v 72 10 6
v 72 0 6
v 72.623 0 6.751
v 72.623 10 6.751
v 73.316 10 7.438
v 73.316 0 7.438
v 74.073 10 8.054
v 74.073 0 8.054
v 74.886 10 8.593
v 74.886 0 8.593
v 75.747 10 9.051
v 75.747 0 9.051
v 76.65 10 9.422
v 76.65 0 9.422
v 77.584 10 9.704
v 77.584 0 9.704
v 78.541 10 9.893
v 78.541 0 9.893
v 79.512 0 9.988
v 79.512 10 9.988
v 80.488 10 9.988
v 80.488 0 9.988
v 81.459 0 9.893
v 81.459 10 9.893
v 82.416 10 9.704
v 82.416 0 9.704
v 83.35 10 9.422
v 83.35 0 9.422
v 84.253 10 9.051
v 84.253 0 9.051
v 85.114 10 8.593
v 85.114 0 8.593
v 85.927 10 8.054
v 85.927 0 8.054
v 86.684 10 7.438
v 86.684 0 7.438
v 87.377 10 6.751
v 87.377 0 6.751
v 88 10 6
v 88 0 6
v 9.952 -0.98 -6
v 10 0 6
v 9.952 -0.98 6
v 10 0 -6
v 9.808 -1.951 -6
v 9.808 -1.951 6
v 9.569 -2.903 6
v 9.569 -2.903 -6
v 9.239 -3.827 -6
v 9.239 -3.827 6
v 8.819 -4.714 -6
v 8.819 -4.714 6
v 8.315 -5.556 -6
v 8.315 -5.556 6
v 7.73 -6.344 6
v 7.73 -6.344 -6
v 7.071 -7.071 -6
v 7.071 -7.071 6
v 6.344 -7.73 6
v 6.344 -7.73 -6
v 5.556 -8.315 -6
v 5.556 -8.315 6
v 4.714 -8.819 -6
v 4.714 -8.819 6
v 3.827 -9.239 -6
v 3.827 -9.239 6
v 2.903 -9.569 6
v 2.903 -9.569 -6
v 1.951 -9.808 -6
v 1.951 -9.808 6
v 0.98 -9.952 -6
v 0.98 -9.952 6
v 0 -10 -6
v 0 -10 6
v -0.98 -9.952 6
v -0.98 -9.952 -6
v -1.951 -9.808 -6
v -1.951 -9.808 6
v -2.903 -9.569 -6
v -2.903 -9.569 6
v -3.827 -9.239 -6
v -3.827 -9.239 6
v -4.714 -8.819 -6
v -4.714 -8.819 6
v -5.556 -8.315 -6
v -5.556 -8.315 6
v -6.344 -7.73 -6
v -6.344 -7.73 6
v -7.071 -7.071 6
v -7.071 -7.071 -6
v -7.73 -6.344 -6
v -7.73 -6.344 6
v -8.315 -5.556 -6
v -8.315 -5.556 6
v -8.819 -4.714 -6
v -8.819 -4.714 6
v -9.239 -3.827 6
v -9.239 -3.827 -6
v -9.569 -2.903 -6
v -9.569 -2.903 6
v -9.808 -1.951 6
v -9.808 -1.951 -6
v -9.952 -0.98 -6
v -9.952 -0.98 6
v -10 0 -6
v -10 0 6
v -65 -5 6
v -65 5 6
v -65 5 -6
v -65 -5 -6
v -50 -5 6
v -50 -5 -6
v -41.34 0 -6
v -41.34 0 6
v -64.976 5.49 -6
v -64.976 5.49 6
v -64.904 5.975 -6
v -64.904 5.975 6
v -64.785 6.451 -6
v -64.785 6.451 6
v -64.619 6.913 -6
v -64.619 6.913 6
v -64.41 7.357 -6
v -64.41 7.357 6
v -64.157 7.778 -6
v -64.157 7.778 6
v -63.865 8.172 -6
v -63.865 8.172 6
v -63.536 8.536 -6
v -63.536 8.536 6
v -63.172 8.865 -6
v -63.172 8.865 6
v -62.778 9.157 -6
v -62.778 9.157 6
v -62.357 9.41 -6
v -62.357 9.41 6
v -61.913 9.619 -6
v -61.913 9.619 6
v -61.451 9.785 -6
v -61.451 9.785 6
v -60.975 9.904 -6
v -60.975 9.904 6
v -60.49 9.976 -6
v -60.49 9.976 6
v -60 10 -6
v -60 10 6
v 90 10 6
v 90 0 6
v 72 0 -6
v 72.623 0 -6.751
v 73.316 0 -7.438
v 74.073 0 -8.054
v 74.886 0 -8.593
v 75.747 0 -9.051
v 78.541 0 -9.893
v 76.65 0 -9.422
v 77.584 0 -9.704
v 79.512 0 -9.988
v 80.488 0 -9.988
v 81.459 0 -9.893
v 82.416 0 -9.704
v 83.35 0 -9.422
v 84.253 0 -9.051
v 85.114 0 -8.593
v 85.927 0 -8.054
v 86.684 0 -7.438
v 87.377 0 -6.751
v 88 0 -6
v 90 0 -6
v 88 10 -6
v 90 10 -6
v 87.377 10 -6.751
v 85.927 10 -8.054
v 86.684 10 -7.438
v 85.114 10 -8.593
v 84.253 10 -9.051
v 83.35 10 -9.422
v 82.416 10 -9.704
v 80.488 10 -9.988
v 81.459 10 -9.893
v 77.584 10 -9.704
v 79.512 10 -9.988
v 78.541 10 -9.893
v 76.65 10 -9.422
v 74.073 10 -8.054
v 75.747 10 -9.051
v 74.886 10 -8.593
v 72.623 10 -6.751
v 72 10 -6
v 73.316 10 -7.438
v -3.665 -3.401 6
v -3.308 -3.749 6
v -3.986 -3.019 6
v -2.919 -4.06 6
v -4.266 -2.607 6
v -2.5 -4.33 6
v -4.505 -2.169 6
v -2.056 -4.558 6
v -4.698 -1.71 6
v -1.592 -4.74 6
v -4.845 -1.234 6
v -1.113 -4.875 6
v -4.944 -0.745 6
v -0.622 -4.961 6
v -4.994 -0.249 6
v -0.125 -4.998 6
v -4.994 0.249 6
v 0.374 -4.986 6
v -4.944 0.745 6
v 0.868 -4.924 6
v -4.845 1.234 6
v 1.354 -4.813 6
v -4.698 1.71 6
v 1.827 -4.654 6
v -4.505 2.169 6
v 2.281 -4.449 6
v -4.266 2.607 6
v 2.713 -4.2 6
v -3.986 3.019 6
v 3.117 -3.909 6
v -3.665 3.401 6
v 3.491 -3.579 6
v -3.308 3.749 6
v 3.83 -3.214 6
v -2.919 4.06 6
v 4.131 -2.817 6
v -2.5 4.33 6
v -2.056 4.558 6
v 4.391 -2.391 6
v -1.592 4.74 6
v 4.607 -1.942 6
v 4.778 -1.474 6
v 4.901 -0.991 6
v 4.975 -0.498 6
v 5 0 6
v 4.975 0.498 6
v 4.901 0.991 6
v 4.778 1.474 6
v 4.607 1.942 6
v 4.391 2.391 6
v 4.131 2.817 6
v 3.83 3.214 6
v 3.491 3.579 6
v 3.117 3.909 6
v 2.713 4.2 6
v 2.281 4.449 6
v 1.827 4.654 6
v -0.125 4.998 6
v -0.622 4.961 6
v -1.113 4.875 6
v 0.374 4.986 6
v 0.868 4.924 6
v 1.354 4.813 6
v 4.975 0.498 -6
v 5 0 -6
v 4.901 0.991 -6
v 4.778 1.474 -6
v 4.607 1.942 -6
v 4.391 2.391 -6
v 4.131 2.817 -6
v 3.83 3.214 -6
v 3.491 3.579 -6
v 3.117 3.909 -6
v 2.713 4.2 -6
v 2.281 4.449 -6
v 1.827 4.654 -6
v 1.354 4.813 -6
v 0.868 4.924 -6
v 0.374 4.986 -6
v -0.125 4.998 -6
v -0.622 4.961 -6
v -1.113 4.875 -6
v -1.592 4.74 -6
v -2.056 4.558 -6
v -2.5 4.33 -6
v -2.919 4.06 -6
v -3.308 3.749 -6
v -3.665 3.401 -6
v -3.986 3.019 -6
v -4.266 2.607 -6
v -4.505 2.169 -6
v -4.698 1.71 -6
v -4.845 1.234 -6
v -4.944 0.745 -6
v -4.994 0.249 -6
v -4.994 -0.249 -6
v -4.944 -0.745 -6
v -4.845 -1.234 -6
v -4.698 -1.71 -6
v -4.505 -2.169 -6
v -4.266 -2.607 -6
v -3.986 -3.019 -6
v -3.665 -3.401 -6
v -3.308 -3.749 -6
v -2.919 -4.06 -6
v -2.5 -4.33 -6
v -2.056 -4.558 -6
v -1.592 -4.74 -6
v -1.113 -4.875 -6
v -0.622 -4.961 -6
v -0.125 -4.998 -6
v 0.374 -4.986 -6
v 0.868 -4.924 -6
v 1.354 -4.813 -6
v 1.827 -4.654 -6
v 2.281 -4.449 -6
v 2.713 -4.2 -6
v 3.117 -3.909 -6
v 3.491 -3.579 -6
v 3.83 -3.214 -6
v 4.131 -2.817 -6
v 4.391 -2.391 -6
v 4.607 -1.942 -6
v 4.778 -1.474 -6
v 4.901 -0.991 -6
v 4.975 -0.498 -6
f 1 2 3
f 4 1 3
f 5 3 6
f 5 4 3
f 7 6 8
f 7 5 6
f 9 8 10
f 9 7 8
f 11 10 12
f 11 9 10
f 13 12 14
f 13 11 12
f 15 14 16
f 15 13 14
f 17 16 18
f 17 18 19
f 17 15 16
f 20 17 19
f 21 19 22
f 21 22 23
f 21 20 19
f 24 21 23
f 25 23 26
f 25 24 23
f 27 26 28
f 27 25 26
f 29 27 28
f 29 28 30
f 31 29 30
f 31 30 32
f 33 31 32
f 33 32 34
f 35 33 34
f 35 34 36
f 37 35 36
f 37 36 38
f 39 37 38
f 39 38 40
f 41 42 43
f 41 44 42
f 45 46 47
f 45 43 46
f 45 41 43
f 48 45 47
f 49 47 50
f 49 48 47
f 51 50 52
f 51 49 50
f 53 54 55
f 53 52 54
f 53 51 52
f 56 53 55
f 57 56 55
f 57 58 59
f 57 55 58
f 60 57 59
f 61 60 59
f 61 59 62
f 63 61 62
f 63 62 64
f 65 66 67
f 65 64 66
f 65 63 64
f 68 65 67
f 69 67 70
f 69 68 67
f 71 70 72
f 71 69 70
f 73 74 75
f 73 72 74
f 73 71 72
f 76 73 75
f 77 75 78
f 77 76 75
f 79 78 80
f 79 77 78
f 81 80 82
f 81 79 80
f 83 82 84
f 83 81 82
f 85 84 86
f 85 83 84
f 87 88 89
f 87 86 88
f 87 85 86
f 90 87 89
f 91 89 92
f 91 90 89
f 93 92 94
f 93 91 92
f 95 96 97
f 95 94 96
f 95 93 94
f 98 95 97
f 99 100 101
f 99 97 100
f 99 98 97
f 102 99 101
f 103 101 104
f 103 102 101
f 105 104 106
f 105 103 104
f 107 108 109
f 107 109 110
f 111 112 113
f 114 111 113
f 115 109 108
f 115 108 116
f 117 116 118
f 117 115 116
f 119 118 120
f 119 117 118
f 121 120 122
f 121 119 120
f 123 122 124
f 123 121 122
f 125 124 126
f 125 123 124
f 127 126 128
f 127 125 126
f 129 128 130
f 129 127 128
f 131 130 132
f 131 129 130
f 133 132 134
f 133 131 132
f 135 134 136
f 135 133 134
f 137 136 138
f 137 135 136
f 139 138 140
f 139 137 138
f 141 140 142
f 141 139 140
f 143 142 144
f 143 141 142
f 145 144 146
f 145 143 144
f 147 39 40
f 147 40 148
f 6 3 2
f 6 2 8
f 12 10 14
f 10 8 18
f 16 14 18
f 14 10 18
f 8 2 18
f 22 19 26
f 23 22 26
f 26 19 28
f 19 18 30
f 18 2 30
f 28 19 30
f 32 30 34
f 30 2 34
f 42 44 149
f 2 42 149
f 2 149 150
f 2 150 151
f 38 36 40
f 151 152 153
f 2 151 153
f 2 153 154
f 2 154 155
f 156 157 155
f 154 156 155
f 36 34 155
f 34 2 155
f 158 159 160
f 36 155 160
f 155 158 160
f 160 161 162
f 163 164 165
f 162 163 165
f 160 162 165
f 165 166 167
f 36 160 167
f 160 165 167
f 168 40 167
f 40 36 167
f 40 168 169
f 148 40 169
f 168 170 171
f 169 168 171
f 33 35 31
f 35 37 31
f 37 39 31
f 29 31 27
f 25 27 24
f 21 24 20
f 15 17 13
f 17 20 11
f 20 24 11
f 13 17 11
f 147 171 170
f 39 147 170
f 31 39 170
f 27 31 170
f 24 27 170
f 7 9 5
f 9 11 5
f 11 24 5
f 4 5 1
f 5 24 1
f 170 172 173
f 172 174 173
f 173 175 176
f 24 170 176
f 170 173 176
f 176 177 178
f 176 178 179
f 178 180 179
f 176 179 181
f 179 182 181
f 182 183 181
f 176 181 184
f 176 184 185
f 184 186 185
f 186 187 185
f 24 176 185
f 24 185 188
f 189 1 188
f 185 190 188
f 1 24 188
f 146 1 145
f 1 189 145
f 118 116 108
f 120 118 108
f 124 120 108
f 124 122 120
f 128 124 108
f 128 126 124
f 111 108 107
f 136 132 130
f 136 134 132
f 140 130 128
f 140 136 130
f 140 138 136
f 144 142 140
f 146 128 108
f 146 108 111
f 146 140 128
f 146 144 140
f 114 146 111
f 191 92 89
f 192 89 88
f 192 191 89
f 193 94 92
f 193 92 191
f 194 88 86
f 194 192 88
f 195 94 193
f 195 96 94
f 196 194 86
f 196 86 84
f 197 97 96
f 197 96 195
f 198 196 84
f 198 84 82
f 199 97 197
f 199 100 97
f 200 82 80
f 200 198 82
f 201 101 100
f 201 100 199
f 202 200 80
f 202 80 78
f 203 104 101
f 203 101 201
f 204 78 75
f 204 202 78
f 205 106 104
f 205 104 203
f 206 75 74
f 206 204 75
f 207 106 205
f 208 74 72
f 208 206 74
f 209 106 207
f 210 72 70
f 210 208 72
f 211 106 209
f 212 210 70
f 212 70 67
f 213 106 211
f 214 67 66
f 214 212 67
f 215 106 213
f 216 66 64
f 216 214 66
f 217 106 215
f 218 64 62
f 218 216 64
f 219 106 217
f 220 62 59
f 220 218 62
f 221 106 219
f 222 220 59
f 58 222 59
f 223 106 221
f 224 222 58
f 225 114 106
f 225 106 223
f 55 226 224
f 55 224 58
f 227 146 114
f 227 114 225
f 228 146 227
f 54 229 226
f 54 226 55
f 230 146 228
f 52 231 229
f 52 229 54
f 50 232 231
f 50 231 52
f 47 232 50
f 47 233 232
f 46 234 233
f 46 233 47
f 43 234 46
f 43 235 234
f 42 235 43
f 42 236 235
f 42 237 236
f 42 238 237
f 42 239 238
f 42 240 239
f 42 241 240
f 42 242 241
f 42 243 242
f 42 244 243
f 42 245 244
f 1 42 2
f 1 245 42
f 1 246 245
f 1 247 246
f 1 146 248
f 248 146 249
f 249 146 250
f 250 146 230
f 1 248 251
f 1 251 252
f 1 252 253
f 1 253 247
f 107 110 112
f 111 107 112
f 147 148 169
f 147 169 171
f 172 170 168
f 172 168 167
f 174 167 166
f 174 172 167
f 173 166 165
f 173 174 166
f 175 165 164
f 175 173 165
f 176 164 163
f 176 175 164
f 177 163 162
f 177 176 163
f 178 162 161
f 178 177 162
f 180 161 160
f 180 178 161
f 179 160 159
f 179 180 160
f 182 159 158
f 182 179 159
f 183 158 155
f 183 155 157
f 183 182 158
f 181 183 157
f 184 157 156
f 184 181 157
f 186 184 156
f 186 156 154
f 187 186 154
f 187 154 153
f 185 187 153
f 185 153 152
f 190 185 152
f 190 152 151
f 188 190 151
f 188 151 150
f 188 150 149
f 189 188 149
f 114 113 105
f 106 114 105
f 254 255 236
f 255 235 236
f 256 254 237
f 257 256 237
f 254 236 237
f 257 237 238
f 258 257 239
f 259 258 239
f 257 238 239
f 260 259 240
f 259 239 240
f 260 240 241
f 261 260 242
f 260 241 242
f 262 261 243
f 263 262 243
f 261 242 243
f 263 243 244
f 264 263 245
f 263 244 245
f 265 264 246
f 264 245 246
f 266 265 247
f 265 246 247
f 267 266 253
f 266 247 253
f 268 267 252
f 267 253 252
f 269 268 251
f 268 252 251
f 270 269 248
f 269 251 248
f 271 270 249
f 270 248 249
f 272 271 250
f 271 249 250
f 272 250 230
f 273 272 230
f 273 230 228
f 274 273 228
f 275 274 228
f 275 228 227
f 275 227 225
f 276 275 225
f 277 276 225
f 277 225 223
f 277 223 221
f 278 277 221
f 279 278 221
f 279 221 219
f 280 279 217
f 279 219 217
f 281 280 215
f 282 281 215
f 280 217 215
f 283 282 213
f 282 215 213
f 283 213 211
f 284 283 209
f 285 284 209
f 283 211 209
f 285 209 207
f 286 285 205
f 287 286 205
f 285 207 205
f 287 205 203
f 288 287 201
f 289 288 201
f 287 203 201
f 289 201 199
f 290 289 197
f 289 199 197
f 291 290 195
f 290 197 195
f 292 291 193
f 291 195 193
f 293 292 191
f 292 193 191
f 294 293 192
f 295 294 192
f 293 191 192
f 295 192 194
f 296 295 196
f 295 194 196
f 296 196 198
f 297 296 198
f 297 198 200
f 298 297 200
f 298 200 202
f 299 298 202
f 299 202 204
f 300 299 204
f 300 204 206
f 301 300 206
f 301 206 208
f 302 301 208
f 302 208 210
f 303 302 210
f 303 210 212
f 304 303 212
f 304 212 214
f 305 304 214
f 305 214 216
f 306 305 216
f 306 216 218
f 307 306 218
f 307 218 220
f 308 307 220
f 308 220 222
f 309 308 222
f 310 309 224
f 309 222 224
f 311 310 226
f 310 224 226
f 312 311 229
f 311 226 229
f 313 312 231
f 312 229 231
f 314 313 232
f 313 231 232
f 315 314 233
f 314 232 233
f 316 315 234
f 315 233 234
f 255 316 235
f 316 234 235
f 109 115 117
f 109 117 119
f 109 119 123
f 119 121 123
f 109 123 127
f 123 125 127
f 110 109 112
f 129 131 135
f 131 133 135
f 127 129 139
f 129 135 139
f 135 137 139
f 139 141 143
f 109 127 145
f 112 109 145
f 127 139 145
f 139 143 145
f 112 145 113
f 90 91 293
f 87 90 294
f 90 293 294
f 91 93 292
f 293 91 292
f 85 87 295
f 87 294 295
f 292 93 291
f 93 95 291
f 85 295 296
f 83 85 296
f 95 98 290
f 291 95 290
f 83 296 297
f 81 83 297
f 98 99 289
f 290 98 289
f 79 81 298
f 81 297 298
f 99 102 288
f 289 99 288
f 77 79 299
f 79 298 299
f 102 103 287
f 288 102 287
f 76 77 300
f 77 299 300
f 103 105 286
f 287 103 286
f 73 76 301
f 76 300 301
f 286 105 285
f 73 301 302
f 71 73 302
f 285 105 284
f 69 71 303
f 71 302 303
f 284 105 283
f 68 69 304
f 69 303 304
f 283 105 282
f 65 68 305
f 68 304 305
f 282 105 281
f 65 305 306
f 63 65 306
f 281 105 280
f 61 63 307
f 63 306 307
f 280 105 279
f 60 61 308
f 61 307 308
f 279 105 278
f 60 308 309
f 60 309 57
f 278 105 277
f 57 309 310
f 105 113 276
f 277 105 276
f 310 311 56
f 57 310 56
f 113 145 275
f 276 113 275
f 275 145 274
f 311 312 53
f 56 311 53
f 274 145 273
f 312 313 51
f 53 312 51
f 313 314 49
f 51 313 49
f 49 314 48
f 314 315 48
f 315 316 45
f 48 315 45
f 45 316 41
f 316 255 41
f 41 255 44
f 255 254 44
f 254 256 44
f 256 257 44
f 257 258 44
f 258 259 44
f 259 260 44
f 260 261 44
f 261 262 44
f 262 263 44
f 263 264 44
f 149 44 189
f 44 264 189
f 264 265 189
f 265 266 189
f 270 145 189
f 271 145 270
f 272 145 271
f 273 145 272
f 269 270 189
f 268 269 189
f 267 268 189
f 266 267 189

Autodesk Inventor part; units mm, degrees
ref_plane "YZ Plane" through (0, 0, 0) normal (1, 0, 0) x (0, 1, 0)
ref_plane "XZ Plane" through (0, 0, 0) normal (0, 1, 0) x (-1, 0, 0)
ref_plane "XY Plane" through (0, 0, 0) normal (0, 0, 1) x (1, 0, 0)
sketch "Esboço1" plane through (0, 0, 0) normal (0, 0, 1) x (1, 0, 0)
  arc A0 (-10, 0) -> (10, 0) centre (0, 0) ccw
  line L0 (10, 0) -> (90, 0)
  line L1 (90, 0) -> (90, 10)
  line L2 (90, 10) -> (-65, 10)
  line L3 (-65, 10) -> (-65, -5)
  line L4 (-65, -5) -> (-50, -5)
  line L5 (-50, -5) -> (-41.3397, 0)
  line L6 (-41.3397, 0) -> (-10, 0)
  dimension "d0" = 20
  dimension "d1" = 155
  dimension "d2" = 90
  dimension "d3" = 15
  dimension "d4" = 30
  dimension "d5" = 10
  dimension "d6" = 15
extrude "Extrusão1" add sketch "Esboço1" along normal mid plane 12
fillet "Arredondamento1" radius 5 1 edges at (-65, 10, 0)
sketch "Esboço2" plane through (0, 0, 6) normal (0, 0, 1) x (1, 0, 0)
  circle A0 centre (0, 0) radius 5
  dimension "d10" = 10
extrude "Extrusão2" cut sketch "Esboço2" against normal through all
sketch "Esboço3" plane through (90, 10, 6) normal (0, 1, 0) x (1, 0, 0)
  circle A0 centre (-10, 6) radius 10
  line L0 (0, 12) -> (0, 0) projected
  line L1 (-150, 0) -> (-150, 12) projected
  point P0 (-90, 6)
  point P1 (-150, 6)
  dimension "d13" = 20
  dimension "d14" = 10
extrude "Extrusão3" add sketch "Esboço3" against normal blind 10
properties material "Liga de aço"
